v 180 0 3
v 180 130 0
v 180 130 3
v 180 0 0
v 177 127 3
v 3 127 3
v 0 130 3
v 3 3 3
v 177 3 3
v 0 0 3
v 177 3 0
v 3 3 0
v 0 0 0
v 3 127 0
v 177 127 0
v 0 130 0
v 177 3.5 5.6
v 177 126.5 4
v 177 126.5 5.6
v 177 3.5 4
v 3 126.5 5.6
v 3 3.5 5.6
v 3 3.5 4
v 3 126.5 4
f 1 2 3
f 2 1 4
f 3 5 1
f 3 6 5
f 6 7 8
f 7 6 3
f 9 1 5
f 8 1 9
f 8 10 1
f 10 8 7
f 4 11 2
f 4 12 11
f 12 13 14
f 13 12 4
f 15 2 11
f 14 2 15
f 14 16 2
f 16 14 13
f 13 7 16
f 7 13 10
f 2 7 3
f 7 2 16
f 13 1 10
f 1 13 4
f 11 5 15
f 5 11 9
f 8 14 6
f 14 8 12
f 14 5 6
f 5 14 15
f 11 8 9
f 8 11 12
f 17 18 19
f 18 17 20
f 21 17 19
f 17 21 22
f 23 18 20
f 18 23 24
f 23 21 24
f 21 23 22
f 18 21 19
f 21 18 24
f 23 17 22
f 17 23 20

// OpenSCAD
// Phase 4 placeholder: rough envelope only, not printable enclosure geometry.

pcb_width = 174;
pcb_height = 123;
frame_width = 180;
frame_height = 130;
wall = 3;

module pcb_envelope() {
    color("seagreen")
        translate([(frame_width - pcb_width) / 2, (frame_height - pcb_height) / 2, 0])
            cube([pcb_width, pcb_height, 1.6]);
}

module frame_envelope() {
    difference() {
        cube([frame_width, frame_height, wall]);
        translate([wall, wall, -0.1])
            cube([frame_width - 2 * wall, frame_height - 2 * wall, wall + 0.2]);
    }
}

frame_envelope();
translate([0, 0, wall + 1])
    pcb_envelope();
